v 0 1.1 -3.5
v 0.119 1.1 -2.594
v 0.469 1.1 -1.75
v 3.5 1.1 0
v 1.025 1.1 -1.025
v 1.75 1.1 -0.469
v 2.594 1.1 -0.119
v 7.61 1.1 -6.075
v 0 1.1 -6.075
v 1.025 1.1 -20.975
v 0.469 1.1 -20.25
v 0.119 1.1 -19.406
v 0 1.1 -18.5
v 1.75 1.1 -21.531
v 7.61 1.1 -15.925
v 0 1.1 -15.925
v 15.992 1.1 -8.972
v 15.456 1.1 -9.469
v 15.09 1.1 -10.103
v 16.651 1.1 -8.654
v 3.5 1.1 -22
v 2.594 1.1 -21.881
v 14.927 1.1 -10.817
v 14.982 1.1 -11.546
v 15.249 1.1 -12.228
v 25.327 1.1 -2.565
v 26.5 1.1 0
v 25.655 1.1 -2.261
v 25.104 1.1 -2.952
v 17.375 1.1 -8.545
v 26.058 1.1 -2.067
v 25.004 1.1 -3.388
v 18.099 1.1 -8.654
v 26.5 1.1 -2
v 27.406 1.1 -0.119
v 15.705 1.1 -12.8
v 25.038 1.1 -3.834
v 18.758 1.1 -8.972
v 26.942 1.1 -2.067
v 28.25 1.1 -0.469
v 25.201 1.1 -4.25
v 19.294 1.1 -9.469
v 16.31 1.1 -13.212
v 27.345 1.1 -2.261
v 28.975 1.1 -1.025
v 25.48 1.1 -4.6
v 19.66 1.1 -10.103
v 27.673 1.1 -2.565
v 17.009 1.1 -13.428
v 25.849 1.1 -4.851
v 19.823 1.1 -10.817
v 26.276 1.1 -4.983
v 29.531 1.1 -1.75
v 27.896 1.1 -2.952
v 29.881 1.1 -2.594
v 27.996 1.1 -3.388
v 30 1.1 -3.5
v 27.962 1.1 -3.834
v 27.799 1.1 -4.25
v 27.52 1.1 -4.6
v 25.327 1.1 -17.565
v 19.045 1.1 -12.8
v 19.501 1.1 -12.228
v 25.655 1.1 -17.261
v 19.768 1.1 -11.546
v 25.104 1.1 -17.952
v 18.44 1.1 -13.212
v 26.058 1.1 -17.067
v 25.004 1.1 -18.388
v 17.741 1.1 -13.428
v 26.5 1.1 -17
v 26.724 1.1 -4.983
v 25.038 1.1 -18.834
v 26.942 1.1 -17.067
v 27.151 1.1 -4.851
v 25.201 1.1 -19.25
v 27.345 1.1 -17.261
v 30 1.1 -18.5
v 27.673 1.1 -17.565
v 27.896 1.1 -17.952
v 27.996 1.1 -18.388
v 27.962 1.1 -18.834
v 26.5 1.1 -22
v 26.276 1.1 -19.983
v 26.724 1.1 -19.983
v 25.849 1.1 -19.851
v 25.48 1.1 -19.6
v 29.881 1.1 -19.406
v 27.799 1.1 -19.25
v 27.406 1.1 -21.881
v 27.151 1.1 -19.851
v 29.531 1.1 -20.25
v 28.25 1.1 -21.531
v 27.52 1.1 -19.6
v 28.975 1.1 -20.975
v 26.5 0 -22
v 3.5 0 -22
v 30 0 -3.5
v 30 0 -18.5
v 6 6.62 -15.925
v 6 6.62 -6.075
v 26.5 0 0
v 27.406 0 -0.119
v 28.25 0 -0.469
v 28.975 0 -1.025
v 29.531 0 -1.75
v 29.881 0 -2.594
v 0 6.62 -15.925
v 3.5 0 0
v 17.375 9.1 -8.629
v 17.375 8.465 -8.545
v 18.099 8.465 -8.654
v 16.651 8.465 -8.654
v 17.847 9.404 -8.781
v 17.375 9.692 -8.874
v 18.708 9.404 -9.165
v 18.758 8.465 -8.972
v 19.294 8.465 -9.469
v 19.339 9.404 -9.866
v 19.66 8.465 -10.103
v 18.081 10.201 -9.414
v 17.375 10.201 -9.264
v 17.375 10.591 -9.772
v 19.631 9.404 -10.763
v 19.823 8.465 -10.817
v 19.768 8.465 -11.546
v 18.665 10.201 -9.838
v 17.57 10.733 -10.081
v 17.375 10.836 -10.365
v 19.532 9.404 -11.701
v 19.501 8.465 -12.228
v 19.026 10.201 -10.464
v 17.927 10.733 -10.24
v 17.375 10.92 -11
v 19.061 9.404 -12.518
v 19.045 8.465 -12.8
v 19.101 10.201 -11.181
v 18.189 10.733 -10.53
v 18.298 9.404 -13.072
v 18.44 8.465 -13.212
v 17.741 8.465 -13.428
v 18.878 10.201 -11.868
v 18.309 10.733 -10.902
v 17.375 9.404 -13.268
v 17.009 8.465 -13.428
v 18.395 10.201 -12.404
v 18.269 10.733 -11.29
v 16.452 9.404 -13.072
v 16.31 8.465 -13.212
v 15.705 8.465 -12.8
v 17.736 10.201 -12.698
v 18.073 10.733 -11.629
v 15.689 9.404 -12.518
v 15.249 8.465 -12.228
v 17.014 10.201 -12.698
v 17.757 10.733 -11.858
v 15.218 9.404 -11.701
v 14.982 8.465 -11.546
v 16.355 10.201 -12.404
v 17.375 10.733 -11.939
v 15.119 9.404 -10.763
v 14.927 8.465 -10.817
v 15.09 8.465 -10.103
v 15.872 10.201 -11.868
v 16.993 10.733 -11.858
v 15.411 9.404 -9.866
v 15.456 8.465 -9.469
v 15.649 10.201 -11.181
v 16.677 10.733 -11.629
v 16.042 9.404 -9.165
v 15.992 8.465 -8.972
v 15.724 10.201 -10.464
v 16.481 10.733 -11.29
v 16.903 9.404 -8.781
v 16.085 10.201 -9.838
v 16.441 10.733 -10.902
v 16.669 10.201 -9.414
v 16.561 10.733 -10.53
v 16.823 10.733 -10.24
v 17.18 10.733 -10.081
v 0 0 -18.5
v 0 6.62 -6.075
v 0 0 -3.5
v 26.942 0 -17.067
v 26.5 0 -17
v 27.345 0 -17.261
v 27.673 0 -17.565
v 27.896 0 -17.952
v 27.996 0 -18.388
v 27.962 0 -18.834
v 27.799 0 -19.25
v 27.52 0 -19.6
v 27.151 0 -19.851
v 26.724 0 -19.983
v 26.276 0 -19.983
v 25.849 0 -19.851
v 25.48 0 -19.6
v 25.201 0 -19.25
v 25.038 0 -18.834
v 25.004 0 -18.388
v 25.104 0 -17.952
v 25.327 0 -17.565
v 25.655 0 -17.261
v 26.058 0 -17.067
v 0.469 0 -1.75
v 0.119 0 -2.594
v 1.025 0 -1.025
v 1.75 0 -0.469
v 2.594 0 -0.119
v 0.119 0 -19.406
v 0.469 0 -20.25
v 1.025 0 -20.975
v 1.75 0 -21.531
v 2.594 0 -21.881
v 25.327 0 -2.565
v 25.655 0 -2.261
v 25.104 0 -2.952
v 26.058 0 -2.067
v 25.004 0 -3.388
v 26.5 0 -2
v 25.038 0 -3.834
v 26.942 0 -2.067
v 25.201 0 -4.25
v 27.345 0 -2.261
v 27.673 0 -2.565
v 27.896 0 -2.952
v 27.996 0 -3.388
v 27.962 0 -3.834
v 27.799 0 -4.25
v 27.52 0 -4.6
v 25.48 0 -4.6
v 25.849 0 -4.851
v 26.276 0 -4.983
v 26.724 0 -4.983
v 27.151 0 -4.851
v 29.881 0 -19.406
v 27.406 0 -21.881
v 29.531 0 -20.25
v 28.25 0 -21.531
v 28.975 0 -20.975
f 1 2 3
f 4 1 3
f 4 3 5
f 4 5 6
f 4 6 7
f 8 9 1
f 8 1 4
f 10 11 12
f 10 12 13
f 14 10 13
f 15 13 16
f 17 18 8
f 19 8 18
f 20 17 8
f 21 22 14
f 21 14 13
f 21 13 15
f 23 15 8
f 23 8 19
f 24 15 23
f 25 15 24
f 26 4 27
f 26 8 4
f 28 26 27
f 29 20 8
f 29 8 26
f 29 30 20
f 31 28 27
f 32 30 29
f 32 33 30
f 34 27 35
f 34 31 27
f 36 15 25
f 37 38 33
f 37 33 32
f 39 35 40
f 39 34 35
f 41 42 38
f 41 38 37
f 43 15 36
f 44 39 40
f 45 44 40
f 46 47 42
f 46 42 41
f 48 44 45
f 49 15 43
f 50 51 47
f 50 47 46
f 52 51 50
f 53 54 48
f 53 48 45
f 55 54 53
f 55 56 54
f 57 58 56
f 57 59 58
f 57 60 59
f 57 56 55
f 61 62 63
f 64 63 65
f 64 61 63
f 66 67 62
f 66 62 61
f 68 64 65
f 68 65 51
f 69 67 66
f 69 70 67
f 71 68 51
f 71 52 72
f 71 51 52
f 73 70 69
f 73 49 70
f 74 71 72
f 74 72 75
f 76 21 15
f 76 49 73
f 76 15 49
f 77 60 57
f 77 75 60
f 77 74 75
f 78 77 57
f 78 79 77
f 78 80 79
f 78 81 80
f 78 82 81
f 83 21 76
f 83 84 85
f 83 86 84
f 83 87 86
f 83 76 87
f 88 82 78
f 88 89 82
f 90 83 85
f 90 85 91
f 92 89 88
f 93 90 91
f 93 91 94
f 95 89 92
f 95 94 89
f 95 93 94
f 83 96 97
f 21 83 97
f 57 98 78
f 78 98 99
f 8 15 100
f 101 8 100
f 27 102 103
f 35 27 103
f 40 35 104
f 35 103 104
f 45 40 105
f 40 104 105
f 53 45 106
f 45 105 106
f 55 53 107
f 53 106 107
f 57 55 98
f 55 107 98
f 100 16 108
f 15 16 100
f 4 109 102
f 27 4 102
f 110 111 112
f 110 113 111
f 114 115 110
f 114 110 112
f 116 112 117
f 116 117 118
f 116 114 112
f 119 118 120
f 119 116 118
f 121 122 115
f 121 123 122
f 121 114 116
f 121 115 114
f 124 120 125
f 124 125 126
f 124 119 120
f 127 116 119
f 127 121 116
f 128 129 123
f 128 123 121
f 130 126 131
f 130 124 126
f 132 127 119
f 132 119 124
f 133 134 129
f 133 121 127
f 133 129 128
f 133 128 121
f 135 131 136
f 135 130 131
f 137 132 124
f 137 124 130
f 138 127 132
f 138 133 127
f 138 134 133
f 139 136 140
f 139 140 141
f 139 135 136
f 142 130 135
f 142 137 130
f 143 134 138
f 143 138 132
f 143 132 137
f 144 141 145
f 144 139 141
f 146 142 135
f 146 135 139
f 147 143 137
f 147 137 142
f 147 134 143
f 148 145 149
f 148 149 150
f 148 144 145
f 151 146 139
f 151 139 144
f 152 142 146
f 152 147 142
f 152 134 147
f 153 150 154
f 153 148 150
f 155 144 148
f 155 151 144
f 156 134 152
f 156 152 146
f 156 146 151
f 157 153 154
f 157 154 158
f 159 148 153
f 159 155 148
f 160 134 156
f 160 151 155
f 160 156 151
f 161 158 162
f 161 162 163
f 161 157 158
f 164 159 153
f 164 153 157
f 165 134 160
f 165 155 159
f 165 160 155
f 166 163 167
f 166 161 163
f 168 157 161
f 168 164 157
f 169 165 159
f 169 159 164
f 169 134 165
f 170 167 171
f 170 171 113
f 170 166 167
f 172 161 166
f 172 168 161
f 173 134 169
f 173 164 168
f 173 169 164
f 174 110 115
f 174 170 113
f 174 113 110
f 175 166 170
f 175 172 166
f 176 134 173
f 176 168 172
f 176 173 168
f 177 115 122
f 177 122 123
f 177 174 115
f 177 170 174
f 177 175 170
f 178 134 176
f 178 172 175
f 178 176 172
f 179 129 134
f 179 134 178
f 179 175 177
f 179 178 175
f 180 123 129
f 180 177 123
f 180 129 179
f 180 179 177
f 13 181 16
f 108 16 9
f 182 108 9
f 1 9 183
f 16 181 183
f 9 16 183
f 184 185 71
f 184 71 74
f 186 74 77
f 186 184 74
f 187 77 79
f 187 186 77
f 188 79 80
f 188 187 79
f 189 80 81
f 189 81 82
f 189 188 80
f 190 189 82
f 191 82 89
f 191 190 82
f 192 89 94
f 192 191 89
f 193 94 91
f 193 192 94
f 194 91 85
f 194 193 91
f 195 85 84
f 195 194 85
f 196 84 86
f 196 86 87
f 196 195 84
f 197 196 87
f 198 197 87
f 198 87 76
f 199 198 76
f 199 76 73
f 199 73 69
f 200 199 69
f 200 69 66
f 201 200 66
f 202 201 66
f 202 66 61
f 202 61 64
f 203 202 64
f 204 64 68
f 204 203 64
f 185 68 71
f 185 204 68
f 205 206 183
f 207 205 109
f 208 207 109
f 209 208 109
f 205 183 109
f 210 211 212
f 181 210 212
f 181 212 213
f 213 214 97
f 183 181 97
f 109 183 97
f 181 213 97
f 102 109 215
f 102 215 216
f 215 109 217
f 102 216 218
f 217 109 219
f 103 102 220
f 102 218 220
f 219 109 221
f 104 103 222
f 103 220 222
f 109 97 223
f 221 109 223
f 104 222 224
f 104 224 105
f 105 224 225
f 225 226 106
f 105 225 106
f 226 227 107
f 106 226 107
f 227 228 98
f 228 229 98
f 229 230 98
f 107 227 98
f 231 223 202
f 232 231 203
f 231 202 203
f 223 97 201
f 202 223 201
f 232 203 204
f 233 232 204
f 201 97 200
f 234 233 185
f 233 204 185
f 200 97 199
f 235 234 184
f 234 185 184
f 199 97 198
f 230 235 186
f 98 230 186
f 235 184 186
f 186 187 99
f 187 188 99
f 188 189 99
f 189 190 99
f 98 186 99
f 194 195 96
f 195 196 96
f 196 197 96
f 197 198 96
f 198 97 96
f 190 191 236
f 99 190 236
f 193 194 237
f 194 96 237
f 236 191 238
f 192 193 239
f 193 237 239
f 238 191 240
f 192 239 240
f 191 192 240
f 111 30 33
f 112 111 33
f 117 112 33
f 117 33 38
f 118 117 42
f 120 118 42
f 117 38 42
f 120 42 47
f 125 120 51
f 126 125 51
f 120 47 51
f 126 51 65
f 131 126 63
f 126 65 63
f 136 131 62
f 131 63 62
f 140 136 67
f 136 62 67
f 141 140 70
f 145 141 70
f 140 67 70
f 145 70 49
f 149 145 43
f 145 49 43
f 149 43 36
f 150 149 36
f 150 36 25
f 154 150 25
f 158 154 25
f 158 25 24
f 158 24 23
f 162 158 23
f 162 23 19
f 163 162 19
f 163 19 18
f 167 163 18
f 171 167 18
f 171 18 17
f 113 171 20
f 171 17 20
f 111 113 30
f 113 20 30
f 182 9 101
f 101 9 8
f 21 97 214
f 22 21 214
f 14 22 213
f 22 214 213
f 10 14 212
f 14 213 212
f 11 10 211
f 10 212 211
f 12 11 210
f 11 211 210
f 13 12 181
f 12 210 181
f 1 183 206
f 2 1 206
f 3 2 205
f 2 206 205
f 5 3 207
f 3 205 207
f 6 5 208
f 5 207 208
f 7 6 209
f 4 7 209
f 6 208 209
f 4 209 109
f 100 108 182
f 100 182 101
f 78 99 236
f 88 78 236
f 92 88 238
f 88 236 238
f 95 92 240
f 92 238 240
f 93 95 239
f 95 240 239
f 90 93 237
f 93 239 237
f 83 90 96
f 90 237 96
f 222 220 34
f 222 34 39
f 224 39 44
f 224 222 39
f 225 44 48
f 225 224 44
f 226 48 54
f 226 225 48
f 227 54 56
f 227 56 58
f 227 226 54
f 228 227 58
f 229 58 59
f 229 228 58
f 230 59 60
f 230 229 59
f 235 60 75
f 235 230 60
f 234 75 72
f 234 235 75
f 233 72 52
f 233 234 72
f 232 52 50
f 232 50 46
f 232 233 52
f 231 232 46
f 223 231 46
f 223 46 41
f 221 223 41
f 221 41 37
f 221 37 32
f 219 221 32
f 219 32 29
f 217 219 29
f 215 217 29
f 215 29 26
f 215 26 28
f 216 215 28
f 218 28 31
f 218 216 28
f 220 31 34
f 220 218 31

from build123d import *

# Parameters (mm, degrees)
SKETCH1_R           = 1.5
BOSS_EXTRUDE1_DEPTH = 1.1
SKETCH2_R           = 2.455
BOSS_EXTRUDE2_DEPTH = 7.365
DOME1_FACE_RADIUS   = 2.455
DOME1_HEIGHT        = 2.455
SKETCH9_W           = 6
SKETCH9_H           = 9.85
BOSS_EXTRUDE3_DEPTH = 5.52
BOSS_EXTRUDE4_DEPTH = 9.85


with BuildPart() as part:
    # Sketch1 → Boss-Extrude1 (new body)
    with BuildSketch(Plane(origin=(0, 0, 0), x_dir=(1, 0, 0), z_dir=(0, 1, 0))):
        with BuildLine():
            Line((3.5, 0), (26.5, 0))
            ThreePointArc((26.5, 0), (28.974873734, 1.025126266), (30, 3.5))
            Line((30, 3.5), (30, 18.5))
            ThreePointArc((30, 18.5), (28.974873734, 20.974873734), (26.5, 22))
            Line((26.5, 22), (3.5, 22))
            ThreePointArc((3.5, 22), (1.025126266, 20.974873734), (0, 18.5))
            Line((0, 18.5), (0, 3.5))
            ThreePointArc((0, 3.5), (1.025126266, 1.025126266), (3.5, 0))
        make_face()
        with Locations(Location((26.5, 18.5, 0), (0, 0, 270))):
            Circle(SKETCH1_R, mode=Mode.SUBTRACT)
        with Locations(Location((26.5, 3.5, 0), (0, 0, 270))):
            Circle(SKETCH1_R, mode=Mode.SUBTRACT)
    extrude(amount=BOSS_EXTRUDE1_DEPTH)

    # Sketch2 → Boss-Extrude2 (add)
    with BuildSketch(Plane(origin=(0, 1.1, 0), x_dir=(1, 0, 0), z_dir=(0, 1, 0))):
        with Locations(Location((17.375, 11, 0), (0, 0, 270))):
            Circle(SKETCH2_R)
    extrude(amount=BOSS_EXTRUDE2_DEPTH)

    # Dome1: a dome of height H over a round flat face of radius A is a cap of a sphere of radius (A * A + H * H) / (2 * H)
    dome1_r = (DOME1_FACE_RADIUS * DOME1_FACE_RADIUS + DOME1_HEIGHT * DOME1_HEIGHT) / (2 * DOME1_HEIGHT)
    dome1_base = Plane((17.375, 8.465, -11), z_dir=(0, 1, 0))
    with Locations(dome1_base.offset(DOME1_HEIGHT - dome1_r)):
        dome1_ball = Sphere(dome1_r, mode=Mode.PRIVATE)
    add(split(dome1_ball, bisect_by=dome1_base, keep=Keep.TOP, mode=Mode.PRIVATE))

    # Sketch9 → Boss-Extrude3 (add)
    with BuildSketch(Plane(origin=(0, 1.1, 0), x_dir=(1, 0, 0), z_dir=(0, 1, 0))):
        with Locations((3, 11)):
            Rectangle(SKETCH9_W, SKETCH9_H)
    extrude(amount=BOSS_EXTRUDE3_DEPTH)

    # Sketch11 → Boss-Extrude4 (add)
    with BuildSketch(Plane(origin=(0, 0, -15.925), x_dir=(-1, 0, 0), z_dir=(0, 0, -1))):
        Polygon((0, 1.1), (-7.61, 1.1), (-6, 6.62), (0, 6.62), align=None)
    extrude(amount=-BOSS_EXTRUDE4_DEPTH)


solid = part.part
